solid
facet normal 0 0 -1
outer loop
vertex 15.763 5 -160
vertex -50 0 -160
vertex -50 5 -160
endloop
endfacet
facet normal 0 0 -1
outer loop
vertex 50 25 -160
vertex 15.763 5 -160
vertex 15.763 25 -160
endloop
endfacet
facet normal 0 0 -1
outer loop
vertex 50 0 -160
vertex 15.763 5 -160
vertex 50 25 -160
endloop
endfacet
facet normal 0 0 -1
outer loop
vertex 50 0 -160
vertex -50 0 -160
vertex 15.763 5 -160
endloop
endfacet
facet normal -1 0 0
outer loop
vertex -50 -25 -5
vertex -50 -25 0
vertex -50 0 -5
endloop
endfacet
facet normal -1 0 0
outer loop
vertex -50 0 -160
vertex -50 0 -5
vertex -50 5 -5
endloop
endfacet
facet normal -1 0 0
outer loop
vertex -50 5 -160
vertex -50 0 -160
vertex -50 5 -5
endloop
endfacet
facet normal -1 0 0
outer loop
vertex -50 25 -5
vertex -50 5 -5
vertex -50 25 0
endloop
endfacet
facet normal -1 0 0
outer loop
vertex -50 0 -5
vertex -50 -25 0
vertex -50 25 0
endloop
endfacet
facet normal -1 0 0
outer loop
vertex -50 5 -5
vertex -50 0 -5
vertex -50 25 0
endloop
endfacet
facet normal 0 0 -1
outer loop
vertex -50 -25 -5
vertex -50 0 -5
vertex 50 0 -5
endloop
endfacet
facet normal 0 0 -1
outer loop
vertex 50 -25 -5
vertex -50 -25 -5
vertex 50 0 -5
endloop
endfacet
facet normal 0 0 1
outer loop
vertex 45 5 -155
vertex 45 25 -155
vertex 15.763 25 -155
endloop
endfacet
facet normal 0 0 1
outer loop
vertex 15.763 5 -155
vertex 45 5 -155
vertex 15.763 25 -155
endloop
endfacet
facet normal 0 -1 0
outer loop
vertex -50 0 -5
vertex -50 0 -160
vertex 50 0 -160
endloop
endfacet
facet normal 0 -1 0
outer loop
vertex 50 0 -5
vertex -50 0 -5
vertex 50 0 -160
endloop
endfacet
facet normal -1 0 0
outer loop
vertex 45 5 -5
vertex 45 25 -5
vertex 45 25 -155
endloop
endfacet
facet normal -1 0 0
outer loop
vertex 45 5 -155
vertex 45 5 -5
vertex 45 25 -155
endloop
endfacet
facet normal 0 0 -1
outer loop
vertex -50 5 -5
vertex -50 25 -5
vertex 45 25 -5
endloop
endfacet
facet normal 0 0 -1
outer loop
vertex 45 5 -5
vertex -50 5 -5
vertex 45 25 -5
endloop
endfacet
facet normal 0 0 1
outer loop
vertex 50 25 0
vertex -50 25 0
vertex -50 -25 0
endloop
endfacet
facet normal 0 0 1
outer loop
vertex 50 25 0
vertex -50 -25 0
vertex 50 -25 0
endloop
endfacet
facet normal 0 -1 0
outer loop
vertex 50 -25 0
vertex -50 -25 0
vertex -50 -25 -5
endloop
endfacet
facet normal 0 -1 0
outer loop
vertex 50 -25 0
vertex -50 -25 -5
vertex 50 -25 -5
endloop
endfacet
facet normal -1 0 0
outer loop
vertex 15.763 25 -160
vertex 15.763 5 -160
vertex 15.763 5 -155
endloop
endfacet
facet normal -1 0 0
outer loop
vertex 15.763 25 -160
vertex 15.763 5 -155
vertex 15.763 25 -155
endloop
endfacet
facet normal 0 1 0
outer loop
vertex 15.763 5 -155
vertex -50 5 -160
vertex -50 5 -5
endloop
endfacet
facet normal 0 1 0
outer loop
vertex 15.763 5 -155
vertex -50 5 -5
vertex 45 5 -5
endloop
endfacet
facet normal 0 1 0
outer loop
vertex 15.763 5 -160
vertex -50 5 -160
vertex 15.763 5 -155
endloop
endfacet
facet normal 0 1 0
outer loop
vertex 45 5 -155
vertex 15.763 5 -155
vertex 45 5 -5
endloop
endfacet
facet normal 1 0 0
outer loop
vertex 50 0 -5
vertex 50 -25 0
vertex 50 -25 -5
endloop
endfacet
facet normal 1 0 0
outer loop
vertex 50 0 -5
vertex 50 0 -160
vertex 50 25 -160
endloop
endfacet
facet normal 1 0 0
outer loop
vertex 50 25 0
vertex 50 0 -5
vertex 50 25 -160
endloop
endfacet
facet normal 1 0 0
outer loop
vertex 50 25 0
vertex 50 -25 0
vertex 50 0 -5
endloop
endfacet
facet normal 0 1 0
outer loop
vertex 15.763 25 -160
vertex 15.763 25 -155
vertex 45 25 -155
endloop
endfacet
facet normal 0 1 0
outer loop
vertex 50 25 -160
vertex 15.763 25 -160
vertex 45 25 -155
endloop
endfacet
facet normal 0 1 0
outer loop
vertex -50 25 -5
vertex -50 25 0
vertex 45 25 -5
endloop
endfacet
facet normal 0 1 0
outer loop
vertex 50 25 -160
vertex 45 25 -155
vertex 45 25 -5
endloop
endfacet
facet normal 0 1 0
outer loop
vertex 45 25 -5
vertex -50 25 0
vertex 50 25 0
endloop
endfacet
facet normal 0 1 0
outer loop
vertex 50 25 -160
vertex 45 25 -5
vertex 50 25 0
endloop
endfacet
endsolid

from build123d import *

# Parameters (mm, degrees)
SKETCH1_W           = 100
SKETCH1_H           = 160
BOSS_EXTRUDE1_DEPTH = 5
SKETCH2_W           = 100
SKETCH2_H           = 50
BOSS_EXTRUDE2_DEPTH = 5
SKETCH4_W           = 160
SKETCH4_H           = 25
BOSS_EXTRUDE3_DEPTH = 5
SKETCH5_W           = 34.236688448
SKETCH5_H           = 25
BOSS_EXTRUDE4_DEPTH = 5


with BuildPart() as part:
    # Sketch1 → Boss-Extrude1 (new body)
    with BuildSketch(Plane(origin=(0, 0, 0), x_dir=(1, 0, 0), z_dir=(0, 1, 0))):
        with Locations((0, 80)):
            Rectangle(SKETCH1_W, SKETCH1_H)
    extrude(amount=BOSS_EXTRUDE1_DEPTH)

    # Sketch2 → Boss-Extrude2 (add)
    with BuildSketch(Plane.XY):
        Rectangle(SKETCH2_W, SKETCH2_H)
    extrude(amount=-BOSS_EXTRUDE2_DEPTH)

    # Sketch4 → Boss-Extrude3 (add)
    with BuildSketch(Plane(origin=(50, 0, 0), x_dir=(0, 0, -1), z_dir=(1, 0, 0))):
        with Locations((80, 12.5)):
            Rectangle(SKETCH4_W, SKETCH4_H)
    extrude(amount=-BOSS_EXTRUDE3_DEPTH)

    # Sketch5 → Boss-Extrude4 (add)
    with BuildSketch(Plane(origin=(0, 0, -160), x_dir=(-1, 0, 0), z_dir=(0, 0, -1))):
        with Locations((-32.881655776, 12.5)):
            Rectangle(SKETCH5_W, SKETCH5_H)
    extrude(amount=-BOSS_EXTRUDE4_DEPTH)


solid = part.part
